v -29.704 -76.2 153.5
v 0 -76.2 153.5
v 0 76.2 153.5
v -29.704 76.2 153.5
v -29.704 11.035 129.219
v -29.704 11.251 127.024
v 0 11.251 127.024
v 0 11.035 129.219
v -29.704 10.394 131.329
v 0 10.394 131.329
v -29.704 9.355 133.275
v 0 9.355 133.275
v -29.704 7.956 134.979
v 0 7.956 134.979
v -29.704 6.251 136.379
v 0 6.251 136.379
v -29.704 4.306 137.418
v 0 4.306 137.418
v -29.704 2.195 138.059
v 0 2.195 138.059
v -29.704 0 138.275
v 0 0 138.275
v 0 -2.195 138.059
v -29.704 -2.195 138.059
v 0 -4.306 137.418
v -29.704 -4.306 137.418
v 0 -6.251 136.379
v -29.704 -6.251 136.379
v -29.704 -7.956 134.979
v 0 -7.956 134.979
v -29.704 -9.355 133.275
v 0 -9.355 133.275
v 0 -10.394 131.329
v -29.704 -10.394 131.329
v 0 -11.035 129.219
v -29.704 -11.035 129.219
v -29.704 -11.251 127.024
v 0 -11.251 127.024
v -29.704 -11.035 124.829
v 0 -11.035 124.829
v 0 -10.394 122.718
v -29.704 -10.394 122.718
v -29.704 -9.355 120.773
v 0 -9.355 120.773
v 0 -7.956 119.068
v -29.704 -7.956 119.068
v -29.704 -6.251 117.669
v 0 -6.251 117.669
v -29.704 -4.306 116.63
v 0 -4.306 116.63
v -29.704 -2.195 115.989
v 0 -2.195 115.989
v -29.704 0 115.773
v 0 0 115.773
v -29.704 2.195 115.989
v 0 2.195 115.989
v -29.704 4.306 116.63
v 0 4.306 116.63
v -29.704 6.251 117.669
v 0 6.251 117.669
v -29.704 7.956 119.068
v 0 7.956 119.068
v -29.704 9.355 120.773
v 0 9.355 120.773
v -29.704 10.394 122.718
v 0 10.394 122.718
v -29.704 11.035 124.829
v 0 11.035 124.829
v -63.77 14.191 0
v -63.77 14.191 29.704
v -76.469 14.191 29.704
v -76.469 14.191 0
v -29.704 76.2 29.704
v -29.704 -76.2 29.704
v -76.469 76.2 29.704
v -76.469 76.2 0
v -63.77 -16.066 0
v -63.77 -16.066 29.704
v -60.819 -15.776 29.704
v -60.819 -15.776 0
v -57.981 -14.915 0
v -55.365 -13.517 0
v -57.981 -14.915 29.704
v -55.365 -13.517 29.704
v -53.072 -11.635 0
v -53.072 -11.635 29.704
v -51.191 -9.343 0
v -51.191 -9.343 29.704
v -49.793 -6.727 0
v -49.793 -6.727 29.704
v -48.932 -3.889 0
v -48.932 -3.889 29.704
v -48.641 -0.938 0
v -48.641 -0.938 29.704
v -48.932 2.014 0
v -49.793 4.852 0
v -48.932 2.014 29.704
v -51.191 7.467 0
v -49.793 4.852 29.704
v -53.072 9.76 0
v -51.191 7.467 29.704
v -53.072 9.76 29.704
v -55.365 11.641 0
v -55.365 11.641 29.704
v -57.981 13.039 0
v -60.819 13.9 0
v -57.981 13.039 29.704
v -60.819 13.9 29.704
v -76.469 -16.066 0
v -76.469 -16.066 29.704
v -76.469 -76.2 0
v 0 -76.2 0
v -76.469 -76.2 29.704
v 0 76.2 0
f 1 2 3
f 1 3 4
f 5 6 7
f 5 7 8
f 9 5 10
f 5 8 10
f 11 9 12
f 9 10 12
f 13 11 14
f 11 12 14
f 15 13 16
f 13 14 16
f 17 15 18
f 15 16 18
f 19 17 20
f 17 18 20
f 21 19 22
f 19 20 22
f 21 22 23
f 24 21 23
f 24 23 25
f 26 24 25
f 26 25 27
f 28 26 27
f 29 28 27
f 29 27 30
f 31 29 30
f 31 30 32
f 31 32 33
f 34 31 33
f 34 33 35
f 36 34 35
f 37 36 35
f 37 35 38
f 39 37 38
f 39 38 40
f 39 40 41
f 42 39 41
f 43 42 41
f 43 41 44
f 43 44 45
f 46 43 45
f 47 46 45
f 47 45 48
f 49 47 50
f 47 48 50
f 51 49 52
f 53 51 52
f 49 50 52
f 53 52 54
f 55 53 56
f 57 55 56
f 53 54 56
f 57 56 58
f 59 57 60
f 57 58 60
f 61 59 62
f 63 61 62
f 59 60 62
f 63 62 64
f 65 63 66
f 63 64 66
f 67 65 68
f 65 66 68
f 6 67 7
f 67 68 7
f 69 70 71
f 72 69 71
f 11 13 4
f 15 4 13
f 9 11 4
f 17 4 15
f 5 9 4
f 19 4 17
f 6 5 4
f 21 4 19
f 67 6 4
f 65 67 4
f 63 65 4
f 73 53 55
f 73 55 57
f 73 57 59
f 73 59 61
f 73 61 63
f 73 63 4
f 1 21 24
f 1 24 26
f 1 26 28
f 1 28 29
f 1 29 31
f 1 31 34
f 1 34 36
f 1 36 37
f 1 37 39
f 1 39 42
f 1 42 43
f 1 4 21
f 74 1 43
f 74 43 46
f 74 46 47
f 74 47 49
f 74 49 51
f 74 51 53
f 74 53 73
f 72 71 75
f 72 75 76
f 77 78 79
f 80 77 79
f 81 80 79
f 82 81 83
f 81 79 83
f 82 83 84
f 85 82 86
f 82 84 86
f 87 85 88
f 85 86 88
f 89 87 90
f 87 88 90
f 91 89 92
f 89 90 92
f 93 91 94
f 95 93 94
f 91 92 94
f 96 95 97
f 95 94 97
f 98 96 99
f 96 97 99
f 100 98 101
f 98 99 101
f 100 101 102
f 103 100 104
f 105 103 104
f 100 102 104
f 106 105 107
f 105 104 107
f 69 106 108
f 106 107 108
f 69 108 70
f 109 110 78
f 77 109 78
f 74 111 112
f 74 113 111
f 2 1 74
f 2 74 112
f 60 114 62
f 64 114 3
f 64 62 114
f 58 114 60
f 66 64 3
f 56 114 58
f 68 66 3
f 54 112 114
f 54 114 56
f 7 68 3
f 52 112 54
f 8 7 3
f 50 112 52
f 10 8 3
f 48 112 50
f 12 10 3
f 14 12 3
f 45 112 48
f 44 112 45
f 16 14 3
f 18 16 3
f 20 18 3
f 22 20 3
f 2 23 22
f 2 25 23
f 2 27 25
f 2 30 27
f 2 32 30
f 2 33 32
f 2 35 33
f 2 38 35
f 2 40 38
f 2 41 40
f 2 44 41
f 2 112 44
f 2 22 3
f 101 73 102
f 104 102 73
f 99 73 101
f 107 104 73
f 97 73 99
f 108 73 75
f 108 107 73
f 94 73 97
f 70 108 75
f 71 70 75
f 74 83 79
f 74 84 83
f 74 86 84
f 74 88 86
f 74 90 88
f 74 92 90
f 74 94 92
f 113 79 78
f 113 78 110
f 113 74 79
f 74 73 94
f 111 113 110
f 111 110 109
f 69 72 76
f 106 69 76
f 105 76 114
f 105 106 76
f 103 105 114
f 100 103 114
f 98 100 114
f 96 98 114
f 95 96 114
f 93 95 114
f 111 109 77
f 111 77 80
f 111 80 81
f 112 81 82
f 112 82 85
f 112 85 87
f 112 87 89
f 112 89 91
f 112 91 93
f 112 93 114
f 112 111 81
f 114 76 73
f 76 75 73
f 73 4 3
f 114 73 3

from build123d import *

# Parameters (mm, degrees)
F1_DEPTH = 76.2
F2_R     = 11.250821
F3_DEPTH = 76.469915
F5_DEPTH = 29.704893


with BuildPart() as f1:
    # F0 (on Front) → F1 (new body, symmetric)
    with BuildSketch(Plane.XZ):
        Polygon((-76.468915, 0), (0, 0), (0, 153.50008), (-29.703893, 153.50008), (-29.703893, 29.703893), (-76.468915, 29.703893), align=None)
    extrude(amount=F1_DEPTH, both=True)

    # F2 (on face) → F3 (cut, through all)
    with BuildSketch(Plane.YZ):
        with Locations((0, 127.023965)):
            Circle(F2_R)
    extrude(amount=-F3_DEPTH, mode=Mode.SUBTRACT)

    # F4 (on face) → F5 (cut, through all)
    with BuildSketch(Plane.XY.offset(29.703893)):
        with BuildLine():
            Line((-76.468915, -16.066248), (-63.770004, -16.066248))
            ThreePointArc((-63.770004, -16.066248), (-48.641407, -0.937651), (-63.770004, 14.190945))
            Line((-63.770004, 14.190945), (-76.468915, 14.190945))
            Line((-76.468915, 14.190945), (-76.468915, -16.066248))
        make_face()
    extrude(amount=-F5_DEPTH, mode=Mode.SUBTRACT)


solid = f1.part
